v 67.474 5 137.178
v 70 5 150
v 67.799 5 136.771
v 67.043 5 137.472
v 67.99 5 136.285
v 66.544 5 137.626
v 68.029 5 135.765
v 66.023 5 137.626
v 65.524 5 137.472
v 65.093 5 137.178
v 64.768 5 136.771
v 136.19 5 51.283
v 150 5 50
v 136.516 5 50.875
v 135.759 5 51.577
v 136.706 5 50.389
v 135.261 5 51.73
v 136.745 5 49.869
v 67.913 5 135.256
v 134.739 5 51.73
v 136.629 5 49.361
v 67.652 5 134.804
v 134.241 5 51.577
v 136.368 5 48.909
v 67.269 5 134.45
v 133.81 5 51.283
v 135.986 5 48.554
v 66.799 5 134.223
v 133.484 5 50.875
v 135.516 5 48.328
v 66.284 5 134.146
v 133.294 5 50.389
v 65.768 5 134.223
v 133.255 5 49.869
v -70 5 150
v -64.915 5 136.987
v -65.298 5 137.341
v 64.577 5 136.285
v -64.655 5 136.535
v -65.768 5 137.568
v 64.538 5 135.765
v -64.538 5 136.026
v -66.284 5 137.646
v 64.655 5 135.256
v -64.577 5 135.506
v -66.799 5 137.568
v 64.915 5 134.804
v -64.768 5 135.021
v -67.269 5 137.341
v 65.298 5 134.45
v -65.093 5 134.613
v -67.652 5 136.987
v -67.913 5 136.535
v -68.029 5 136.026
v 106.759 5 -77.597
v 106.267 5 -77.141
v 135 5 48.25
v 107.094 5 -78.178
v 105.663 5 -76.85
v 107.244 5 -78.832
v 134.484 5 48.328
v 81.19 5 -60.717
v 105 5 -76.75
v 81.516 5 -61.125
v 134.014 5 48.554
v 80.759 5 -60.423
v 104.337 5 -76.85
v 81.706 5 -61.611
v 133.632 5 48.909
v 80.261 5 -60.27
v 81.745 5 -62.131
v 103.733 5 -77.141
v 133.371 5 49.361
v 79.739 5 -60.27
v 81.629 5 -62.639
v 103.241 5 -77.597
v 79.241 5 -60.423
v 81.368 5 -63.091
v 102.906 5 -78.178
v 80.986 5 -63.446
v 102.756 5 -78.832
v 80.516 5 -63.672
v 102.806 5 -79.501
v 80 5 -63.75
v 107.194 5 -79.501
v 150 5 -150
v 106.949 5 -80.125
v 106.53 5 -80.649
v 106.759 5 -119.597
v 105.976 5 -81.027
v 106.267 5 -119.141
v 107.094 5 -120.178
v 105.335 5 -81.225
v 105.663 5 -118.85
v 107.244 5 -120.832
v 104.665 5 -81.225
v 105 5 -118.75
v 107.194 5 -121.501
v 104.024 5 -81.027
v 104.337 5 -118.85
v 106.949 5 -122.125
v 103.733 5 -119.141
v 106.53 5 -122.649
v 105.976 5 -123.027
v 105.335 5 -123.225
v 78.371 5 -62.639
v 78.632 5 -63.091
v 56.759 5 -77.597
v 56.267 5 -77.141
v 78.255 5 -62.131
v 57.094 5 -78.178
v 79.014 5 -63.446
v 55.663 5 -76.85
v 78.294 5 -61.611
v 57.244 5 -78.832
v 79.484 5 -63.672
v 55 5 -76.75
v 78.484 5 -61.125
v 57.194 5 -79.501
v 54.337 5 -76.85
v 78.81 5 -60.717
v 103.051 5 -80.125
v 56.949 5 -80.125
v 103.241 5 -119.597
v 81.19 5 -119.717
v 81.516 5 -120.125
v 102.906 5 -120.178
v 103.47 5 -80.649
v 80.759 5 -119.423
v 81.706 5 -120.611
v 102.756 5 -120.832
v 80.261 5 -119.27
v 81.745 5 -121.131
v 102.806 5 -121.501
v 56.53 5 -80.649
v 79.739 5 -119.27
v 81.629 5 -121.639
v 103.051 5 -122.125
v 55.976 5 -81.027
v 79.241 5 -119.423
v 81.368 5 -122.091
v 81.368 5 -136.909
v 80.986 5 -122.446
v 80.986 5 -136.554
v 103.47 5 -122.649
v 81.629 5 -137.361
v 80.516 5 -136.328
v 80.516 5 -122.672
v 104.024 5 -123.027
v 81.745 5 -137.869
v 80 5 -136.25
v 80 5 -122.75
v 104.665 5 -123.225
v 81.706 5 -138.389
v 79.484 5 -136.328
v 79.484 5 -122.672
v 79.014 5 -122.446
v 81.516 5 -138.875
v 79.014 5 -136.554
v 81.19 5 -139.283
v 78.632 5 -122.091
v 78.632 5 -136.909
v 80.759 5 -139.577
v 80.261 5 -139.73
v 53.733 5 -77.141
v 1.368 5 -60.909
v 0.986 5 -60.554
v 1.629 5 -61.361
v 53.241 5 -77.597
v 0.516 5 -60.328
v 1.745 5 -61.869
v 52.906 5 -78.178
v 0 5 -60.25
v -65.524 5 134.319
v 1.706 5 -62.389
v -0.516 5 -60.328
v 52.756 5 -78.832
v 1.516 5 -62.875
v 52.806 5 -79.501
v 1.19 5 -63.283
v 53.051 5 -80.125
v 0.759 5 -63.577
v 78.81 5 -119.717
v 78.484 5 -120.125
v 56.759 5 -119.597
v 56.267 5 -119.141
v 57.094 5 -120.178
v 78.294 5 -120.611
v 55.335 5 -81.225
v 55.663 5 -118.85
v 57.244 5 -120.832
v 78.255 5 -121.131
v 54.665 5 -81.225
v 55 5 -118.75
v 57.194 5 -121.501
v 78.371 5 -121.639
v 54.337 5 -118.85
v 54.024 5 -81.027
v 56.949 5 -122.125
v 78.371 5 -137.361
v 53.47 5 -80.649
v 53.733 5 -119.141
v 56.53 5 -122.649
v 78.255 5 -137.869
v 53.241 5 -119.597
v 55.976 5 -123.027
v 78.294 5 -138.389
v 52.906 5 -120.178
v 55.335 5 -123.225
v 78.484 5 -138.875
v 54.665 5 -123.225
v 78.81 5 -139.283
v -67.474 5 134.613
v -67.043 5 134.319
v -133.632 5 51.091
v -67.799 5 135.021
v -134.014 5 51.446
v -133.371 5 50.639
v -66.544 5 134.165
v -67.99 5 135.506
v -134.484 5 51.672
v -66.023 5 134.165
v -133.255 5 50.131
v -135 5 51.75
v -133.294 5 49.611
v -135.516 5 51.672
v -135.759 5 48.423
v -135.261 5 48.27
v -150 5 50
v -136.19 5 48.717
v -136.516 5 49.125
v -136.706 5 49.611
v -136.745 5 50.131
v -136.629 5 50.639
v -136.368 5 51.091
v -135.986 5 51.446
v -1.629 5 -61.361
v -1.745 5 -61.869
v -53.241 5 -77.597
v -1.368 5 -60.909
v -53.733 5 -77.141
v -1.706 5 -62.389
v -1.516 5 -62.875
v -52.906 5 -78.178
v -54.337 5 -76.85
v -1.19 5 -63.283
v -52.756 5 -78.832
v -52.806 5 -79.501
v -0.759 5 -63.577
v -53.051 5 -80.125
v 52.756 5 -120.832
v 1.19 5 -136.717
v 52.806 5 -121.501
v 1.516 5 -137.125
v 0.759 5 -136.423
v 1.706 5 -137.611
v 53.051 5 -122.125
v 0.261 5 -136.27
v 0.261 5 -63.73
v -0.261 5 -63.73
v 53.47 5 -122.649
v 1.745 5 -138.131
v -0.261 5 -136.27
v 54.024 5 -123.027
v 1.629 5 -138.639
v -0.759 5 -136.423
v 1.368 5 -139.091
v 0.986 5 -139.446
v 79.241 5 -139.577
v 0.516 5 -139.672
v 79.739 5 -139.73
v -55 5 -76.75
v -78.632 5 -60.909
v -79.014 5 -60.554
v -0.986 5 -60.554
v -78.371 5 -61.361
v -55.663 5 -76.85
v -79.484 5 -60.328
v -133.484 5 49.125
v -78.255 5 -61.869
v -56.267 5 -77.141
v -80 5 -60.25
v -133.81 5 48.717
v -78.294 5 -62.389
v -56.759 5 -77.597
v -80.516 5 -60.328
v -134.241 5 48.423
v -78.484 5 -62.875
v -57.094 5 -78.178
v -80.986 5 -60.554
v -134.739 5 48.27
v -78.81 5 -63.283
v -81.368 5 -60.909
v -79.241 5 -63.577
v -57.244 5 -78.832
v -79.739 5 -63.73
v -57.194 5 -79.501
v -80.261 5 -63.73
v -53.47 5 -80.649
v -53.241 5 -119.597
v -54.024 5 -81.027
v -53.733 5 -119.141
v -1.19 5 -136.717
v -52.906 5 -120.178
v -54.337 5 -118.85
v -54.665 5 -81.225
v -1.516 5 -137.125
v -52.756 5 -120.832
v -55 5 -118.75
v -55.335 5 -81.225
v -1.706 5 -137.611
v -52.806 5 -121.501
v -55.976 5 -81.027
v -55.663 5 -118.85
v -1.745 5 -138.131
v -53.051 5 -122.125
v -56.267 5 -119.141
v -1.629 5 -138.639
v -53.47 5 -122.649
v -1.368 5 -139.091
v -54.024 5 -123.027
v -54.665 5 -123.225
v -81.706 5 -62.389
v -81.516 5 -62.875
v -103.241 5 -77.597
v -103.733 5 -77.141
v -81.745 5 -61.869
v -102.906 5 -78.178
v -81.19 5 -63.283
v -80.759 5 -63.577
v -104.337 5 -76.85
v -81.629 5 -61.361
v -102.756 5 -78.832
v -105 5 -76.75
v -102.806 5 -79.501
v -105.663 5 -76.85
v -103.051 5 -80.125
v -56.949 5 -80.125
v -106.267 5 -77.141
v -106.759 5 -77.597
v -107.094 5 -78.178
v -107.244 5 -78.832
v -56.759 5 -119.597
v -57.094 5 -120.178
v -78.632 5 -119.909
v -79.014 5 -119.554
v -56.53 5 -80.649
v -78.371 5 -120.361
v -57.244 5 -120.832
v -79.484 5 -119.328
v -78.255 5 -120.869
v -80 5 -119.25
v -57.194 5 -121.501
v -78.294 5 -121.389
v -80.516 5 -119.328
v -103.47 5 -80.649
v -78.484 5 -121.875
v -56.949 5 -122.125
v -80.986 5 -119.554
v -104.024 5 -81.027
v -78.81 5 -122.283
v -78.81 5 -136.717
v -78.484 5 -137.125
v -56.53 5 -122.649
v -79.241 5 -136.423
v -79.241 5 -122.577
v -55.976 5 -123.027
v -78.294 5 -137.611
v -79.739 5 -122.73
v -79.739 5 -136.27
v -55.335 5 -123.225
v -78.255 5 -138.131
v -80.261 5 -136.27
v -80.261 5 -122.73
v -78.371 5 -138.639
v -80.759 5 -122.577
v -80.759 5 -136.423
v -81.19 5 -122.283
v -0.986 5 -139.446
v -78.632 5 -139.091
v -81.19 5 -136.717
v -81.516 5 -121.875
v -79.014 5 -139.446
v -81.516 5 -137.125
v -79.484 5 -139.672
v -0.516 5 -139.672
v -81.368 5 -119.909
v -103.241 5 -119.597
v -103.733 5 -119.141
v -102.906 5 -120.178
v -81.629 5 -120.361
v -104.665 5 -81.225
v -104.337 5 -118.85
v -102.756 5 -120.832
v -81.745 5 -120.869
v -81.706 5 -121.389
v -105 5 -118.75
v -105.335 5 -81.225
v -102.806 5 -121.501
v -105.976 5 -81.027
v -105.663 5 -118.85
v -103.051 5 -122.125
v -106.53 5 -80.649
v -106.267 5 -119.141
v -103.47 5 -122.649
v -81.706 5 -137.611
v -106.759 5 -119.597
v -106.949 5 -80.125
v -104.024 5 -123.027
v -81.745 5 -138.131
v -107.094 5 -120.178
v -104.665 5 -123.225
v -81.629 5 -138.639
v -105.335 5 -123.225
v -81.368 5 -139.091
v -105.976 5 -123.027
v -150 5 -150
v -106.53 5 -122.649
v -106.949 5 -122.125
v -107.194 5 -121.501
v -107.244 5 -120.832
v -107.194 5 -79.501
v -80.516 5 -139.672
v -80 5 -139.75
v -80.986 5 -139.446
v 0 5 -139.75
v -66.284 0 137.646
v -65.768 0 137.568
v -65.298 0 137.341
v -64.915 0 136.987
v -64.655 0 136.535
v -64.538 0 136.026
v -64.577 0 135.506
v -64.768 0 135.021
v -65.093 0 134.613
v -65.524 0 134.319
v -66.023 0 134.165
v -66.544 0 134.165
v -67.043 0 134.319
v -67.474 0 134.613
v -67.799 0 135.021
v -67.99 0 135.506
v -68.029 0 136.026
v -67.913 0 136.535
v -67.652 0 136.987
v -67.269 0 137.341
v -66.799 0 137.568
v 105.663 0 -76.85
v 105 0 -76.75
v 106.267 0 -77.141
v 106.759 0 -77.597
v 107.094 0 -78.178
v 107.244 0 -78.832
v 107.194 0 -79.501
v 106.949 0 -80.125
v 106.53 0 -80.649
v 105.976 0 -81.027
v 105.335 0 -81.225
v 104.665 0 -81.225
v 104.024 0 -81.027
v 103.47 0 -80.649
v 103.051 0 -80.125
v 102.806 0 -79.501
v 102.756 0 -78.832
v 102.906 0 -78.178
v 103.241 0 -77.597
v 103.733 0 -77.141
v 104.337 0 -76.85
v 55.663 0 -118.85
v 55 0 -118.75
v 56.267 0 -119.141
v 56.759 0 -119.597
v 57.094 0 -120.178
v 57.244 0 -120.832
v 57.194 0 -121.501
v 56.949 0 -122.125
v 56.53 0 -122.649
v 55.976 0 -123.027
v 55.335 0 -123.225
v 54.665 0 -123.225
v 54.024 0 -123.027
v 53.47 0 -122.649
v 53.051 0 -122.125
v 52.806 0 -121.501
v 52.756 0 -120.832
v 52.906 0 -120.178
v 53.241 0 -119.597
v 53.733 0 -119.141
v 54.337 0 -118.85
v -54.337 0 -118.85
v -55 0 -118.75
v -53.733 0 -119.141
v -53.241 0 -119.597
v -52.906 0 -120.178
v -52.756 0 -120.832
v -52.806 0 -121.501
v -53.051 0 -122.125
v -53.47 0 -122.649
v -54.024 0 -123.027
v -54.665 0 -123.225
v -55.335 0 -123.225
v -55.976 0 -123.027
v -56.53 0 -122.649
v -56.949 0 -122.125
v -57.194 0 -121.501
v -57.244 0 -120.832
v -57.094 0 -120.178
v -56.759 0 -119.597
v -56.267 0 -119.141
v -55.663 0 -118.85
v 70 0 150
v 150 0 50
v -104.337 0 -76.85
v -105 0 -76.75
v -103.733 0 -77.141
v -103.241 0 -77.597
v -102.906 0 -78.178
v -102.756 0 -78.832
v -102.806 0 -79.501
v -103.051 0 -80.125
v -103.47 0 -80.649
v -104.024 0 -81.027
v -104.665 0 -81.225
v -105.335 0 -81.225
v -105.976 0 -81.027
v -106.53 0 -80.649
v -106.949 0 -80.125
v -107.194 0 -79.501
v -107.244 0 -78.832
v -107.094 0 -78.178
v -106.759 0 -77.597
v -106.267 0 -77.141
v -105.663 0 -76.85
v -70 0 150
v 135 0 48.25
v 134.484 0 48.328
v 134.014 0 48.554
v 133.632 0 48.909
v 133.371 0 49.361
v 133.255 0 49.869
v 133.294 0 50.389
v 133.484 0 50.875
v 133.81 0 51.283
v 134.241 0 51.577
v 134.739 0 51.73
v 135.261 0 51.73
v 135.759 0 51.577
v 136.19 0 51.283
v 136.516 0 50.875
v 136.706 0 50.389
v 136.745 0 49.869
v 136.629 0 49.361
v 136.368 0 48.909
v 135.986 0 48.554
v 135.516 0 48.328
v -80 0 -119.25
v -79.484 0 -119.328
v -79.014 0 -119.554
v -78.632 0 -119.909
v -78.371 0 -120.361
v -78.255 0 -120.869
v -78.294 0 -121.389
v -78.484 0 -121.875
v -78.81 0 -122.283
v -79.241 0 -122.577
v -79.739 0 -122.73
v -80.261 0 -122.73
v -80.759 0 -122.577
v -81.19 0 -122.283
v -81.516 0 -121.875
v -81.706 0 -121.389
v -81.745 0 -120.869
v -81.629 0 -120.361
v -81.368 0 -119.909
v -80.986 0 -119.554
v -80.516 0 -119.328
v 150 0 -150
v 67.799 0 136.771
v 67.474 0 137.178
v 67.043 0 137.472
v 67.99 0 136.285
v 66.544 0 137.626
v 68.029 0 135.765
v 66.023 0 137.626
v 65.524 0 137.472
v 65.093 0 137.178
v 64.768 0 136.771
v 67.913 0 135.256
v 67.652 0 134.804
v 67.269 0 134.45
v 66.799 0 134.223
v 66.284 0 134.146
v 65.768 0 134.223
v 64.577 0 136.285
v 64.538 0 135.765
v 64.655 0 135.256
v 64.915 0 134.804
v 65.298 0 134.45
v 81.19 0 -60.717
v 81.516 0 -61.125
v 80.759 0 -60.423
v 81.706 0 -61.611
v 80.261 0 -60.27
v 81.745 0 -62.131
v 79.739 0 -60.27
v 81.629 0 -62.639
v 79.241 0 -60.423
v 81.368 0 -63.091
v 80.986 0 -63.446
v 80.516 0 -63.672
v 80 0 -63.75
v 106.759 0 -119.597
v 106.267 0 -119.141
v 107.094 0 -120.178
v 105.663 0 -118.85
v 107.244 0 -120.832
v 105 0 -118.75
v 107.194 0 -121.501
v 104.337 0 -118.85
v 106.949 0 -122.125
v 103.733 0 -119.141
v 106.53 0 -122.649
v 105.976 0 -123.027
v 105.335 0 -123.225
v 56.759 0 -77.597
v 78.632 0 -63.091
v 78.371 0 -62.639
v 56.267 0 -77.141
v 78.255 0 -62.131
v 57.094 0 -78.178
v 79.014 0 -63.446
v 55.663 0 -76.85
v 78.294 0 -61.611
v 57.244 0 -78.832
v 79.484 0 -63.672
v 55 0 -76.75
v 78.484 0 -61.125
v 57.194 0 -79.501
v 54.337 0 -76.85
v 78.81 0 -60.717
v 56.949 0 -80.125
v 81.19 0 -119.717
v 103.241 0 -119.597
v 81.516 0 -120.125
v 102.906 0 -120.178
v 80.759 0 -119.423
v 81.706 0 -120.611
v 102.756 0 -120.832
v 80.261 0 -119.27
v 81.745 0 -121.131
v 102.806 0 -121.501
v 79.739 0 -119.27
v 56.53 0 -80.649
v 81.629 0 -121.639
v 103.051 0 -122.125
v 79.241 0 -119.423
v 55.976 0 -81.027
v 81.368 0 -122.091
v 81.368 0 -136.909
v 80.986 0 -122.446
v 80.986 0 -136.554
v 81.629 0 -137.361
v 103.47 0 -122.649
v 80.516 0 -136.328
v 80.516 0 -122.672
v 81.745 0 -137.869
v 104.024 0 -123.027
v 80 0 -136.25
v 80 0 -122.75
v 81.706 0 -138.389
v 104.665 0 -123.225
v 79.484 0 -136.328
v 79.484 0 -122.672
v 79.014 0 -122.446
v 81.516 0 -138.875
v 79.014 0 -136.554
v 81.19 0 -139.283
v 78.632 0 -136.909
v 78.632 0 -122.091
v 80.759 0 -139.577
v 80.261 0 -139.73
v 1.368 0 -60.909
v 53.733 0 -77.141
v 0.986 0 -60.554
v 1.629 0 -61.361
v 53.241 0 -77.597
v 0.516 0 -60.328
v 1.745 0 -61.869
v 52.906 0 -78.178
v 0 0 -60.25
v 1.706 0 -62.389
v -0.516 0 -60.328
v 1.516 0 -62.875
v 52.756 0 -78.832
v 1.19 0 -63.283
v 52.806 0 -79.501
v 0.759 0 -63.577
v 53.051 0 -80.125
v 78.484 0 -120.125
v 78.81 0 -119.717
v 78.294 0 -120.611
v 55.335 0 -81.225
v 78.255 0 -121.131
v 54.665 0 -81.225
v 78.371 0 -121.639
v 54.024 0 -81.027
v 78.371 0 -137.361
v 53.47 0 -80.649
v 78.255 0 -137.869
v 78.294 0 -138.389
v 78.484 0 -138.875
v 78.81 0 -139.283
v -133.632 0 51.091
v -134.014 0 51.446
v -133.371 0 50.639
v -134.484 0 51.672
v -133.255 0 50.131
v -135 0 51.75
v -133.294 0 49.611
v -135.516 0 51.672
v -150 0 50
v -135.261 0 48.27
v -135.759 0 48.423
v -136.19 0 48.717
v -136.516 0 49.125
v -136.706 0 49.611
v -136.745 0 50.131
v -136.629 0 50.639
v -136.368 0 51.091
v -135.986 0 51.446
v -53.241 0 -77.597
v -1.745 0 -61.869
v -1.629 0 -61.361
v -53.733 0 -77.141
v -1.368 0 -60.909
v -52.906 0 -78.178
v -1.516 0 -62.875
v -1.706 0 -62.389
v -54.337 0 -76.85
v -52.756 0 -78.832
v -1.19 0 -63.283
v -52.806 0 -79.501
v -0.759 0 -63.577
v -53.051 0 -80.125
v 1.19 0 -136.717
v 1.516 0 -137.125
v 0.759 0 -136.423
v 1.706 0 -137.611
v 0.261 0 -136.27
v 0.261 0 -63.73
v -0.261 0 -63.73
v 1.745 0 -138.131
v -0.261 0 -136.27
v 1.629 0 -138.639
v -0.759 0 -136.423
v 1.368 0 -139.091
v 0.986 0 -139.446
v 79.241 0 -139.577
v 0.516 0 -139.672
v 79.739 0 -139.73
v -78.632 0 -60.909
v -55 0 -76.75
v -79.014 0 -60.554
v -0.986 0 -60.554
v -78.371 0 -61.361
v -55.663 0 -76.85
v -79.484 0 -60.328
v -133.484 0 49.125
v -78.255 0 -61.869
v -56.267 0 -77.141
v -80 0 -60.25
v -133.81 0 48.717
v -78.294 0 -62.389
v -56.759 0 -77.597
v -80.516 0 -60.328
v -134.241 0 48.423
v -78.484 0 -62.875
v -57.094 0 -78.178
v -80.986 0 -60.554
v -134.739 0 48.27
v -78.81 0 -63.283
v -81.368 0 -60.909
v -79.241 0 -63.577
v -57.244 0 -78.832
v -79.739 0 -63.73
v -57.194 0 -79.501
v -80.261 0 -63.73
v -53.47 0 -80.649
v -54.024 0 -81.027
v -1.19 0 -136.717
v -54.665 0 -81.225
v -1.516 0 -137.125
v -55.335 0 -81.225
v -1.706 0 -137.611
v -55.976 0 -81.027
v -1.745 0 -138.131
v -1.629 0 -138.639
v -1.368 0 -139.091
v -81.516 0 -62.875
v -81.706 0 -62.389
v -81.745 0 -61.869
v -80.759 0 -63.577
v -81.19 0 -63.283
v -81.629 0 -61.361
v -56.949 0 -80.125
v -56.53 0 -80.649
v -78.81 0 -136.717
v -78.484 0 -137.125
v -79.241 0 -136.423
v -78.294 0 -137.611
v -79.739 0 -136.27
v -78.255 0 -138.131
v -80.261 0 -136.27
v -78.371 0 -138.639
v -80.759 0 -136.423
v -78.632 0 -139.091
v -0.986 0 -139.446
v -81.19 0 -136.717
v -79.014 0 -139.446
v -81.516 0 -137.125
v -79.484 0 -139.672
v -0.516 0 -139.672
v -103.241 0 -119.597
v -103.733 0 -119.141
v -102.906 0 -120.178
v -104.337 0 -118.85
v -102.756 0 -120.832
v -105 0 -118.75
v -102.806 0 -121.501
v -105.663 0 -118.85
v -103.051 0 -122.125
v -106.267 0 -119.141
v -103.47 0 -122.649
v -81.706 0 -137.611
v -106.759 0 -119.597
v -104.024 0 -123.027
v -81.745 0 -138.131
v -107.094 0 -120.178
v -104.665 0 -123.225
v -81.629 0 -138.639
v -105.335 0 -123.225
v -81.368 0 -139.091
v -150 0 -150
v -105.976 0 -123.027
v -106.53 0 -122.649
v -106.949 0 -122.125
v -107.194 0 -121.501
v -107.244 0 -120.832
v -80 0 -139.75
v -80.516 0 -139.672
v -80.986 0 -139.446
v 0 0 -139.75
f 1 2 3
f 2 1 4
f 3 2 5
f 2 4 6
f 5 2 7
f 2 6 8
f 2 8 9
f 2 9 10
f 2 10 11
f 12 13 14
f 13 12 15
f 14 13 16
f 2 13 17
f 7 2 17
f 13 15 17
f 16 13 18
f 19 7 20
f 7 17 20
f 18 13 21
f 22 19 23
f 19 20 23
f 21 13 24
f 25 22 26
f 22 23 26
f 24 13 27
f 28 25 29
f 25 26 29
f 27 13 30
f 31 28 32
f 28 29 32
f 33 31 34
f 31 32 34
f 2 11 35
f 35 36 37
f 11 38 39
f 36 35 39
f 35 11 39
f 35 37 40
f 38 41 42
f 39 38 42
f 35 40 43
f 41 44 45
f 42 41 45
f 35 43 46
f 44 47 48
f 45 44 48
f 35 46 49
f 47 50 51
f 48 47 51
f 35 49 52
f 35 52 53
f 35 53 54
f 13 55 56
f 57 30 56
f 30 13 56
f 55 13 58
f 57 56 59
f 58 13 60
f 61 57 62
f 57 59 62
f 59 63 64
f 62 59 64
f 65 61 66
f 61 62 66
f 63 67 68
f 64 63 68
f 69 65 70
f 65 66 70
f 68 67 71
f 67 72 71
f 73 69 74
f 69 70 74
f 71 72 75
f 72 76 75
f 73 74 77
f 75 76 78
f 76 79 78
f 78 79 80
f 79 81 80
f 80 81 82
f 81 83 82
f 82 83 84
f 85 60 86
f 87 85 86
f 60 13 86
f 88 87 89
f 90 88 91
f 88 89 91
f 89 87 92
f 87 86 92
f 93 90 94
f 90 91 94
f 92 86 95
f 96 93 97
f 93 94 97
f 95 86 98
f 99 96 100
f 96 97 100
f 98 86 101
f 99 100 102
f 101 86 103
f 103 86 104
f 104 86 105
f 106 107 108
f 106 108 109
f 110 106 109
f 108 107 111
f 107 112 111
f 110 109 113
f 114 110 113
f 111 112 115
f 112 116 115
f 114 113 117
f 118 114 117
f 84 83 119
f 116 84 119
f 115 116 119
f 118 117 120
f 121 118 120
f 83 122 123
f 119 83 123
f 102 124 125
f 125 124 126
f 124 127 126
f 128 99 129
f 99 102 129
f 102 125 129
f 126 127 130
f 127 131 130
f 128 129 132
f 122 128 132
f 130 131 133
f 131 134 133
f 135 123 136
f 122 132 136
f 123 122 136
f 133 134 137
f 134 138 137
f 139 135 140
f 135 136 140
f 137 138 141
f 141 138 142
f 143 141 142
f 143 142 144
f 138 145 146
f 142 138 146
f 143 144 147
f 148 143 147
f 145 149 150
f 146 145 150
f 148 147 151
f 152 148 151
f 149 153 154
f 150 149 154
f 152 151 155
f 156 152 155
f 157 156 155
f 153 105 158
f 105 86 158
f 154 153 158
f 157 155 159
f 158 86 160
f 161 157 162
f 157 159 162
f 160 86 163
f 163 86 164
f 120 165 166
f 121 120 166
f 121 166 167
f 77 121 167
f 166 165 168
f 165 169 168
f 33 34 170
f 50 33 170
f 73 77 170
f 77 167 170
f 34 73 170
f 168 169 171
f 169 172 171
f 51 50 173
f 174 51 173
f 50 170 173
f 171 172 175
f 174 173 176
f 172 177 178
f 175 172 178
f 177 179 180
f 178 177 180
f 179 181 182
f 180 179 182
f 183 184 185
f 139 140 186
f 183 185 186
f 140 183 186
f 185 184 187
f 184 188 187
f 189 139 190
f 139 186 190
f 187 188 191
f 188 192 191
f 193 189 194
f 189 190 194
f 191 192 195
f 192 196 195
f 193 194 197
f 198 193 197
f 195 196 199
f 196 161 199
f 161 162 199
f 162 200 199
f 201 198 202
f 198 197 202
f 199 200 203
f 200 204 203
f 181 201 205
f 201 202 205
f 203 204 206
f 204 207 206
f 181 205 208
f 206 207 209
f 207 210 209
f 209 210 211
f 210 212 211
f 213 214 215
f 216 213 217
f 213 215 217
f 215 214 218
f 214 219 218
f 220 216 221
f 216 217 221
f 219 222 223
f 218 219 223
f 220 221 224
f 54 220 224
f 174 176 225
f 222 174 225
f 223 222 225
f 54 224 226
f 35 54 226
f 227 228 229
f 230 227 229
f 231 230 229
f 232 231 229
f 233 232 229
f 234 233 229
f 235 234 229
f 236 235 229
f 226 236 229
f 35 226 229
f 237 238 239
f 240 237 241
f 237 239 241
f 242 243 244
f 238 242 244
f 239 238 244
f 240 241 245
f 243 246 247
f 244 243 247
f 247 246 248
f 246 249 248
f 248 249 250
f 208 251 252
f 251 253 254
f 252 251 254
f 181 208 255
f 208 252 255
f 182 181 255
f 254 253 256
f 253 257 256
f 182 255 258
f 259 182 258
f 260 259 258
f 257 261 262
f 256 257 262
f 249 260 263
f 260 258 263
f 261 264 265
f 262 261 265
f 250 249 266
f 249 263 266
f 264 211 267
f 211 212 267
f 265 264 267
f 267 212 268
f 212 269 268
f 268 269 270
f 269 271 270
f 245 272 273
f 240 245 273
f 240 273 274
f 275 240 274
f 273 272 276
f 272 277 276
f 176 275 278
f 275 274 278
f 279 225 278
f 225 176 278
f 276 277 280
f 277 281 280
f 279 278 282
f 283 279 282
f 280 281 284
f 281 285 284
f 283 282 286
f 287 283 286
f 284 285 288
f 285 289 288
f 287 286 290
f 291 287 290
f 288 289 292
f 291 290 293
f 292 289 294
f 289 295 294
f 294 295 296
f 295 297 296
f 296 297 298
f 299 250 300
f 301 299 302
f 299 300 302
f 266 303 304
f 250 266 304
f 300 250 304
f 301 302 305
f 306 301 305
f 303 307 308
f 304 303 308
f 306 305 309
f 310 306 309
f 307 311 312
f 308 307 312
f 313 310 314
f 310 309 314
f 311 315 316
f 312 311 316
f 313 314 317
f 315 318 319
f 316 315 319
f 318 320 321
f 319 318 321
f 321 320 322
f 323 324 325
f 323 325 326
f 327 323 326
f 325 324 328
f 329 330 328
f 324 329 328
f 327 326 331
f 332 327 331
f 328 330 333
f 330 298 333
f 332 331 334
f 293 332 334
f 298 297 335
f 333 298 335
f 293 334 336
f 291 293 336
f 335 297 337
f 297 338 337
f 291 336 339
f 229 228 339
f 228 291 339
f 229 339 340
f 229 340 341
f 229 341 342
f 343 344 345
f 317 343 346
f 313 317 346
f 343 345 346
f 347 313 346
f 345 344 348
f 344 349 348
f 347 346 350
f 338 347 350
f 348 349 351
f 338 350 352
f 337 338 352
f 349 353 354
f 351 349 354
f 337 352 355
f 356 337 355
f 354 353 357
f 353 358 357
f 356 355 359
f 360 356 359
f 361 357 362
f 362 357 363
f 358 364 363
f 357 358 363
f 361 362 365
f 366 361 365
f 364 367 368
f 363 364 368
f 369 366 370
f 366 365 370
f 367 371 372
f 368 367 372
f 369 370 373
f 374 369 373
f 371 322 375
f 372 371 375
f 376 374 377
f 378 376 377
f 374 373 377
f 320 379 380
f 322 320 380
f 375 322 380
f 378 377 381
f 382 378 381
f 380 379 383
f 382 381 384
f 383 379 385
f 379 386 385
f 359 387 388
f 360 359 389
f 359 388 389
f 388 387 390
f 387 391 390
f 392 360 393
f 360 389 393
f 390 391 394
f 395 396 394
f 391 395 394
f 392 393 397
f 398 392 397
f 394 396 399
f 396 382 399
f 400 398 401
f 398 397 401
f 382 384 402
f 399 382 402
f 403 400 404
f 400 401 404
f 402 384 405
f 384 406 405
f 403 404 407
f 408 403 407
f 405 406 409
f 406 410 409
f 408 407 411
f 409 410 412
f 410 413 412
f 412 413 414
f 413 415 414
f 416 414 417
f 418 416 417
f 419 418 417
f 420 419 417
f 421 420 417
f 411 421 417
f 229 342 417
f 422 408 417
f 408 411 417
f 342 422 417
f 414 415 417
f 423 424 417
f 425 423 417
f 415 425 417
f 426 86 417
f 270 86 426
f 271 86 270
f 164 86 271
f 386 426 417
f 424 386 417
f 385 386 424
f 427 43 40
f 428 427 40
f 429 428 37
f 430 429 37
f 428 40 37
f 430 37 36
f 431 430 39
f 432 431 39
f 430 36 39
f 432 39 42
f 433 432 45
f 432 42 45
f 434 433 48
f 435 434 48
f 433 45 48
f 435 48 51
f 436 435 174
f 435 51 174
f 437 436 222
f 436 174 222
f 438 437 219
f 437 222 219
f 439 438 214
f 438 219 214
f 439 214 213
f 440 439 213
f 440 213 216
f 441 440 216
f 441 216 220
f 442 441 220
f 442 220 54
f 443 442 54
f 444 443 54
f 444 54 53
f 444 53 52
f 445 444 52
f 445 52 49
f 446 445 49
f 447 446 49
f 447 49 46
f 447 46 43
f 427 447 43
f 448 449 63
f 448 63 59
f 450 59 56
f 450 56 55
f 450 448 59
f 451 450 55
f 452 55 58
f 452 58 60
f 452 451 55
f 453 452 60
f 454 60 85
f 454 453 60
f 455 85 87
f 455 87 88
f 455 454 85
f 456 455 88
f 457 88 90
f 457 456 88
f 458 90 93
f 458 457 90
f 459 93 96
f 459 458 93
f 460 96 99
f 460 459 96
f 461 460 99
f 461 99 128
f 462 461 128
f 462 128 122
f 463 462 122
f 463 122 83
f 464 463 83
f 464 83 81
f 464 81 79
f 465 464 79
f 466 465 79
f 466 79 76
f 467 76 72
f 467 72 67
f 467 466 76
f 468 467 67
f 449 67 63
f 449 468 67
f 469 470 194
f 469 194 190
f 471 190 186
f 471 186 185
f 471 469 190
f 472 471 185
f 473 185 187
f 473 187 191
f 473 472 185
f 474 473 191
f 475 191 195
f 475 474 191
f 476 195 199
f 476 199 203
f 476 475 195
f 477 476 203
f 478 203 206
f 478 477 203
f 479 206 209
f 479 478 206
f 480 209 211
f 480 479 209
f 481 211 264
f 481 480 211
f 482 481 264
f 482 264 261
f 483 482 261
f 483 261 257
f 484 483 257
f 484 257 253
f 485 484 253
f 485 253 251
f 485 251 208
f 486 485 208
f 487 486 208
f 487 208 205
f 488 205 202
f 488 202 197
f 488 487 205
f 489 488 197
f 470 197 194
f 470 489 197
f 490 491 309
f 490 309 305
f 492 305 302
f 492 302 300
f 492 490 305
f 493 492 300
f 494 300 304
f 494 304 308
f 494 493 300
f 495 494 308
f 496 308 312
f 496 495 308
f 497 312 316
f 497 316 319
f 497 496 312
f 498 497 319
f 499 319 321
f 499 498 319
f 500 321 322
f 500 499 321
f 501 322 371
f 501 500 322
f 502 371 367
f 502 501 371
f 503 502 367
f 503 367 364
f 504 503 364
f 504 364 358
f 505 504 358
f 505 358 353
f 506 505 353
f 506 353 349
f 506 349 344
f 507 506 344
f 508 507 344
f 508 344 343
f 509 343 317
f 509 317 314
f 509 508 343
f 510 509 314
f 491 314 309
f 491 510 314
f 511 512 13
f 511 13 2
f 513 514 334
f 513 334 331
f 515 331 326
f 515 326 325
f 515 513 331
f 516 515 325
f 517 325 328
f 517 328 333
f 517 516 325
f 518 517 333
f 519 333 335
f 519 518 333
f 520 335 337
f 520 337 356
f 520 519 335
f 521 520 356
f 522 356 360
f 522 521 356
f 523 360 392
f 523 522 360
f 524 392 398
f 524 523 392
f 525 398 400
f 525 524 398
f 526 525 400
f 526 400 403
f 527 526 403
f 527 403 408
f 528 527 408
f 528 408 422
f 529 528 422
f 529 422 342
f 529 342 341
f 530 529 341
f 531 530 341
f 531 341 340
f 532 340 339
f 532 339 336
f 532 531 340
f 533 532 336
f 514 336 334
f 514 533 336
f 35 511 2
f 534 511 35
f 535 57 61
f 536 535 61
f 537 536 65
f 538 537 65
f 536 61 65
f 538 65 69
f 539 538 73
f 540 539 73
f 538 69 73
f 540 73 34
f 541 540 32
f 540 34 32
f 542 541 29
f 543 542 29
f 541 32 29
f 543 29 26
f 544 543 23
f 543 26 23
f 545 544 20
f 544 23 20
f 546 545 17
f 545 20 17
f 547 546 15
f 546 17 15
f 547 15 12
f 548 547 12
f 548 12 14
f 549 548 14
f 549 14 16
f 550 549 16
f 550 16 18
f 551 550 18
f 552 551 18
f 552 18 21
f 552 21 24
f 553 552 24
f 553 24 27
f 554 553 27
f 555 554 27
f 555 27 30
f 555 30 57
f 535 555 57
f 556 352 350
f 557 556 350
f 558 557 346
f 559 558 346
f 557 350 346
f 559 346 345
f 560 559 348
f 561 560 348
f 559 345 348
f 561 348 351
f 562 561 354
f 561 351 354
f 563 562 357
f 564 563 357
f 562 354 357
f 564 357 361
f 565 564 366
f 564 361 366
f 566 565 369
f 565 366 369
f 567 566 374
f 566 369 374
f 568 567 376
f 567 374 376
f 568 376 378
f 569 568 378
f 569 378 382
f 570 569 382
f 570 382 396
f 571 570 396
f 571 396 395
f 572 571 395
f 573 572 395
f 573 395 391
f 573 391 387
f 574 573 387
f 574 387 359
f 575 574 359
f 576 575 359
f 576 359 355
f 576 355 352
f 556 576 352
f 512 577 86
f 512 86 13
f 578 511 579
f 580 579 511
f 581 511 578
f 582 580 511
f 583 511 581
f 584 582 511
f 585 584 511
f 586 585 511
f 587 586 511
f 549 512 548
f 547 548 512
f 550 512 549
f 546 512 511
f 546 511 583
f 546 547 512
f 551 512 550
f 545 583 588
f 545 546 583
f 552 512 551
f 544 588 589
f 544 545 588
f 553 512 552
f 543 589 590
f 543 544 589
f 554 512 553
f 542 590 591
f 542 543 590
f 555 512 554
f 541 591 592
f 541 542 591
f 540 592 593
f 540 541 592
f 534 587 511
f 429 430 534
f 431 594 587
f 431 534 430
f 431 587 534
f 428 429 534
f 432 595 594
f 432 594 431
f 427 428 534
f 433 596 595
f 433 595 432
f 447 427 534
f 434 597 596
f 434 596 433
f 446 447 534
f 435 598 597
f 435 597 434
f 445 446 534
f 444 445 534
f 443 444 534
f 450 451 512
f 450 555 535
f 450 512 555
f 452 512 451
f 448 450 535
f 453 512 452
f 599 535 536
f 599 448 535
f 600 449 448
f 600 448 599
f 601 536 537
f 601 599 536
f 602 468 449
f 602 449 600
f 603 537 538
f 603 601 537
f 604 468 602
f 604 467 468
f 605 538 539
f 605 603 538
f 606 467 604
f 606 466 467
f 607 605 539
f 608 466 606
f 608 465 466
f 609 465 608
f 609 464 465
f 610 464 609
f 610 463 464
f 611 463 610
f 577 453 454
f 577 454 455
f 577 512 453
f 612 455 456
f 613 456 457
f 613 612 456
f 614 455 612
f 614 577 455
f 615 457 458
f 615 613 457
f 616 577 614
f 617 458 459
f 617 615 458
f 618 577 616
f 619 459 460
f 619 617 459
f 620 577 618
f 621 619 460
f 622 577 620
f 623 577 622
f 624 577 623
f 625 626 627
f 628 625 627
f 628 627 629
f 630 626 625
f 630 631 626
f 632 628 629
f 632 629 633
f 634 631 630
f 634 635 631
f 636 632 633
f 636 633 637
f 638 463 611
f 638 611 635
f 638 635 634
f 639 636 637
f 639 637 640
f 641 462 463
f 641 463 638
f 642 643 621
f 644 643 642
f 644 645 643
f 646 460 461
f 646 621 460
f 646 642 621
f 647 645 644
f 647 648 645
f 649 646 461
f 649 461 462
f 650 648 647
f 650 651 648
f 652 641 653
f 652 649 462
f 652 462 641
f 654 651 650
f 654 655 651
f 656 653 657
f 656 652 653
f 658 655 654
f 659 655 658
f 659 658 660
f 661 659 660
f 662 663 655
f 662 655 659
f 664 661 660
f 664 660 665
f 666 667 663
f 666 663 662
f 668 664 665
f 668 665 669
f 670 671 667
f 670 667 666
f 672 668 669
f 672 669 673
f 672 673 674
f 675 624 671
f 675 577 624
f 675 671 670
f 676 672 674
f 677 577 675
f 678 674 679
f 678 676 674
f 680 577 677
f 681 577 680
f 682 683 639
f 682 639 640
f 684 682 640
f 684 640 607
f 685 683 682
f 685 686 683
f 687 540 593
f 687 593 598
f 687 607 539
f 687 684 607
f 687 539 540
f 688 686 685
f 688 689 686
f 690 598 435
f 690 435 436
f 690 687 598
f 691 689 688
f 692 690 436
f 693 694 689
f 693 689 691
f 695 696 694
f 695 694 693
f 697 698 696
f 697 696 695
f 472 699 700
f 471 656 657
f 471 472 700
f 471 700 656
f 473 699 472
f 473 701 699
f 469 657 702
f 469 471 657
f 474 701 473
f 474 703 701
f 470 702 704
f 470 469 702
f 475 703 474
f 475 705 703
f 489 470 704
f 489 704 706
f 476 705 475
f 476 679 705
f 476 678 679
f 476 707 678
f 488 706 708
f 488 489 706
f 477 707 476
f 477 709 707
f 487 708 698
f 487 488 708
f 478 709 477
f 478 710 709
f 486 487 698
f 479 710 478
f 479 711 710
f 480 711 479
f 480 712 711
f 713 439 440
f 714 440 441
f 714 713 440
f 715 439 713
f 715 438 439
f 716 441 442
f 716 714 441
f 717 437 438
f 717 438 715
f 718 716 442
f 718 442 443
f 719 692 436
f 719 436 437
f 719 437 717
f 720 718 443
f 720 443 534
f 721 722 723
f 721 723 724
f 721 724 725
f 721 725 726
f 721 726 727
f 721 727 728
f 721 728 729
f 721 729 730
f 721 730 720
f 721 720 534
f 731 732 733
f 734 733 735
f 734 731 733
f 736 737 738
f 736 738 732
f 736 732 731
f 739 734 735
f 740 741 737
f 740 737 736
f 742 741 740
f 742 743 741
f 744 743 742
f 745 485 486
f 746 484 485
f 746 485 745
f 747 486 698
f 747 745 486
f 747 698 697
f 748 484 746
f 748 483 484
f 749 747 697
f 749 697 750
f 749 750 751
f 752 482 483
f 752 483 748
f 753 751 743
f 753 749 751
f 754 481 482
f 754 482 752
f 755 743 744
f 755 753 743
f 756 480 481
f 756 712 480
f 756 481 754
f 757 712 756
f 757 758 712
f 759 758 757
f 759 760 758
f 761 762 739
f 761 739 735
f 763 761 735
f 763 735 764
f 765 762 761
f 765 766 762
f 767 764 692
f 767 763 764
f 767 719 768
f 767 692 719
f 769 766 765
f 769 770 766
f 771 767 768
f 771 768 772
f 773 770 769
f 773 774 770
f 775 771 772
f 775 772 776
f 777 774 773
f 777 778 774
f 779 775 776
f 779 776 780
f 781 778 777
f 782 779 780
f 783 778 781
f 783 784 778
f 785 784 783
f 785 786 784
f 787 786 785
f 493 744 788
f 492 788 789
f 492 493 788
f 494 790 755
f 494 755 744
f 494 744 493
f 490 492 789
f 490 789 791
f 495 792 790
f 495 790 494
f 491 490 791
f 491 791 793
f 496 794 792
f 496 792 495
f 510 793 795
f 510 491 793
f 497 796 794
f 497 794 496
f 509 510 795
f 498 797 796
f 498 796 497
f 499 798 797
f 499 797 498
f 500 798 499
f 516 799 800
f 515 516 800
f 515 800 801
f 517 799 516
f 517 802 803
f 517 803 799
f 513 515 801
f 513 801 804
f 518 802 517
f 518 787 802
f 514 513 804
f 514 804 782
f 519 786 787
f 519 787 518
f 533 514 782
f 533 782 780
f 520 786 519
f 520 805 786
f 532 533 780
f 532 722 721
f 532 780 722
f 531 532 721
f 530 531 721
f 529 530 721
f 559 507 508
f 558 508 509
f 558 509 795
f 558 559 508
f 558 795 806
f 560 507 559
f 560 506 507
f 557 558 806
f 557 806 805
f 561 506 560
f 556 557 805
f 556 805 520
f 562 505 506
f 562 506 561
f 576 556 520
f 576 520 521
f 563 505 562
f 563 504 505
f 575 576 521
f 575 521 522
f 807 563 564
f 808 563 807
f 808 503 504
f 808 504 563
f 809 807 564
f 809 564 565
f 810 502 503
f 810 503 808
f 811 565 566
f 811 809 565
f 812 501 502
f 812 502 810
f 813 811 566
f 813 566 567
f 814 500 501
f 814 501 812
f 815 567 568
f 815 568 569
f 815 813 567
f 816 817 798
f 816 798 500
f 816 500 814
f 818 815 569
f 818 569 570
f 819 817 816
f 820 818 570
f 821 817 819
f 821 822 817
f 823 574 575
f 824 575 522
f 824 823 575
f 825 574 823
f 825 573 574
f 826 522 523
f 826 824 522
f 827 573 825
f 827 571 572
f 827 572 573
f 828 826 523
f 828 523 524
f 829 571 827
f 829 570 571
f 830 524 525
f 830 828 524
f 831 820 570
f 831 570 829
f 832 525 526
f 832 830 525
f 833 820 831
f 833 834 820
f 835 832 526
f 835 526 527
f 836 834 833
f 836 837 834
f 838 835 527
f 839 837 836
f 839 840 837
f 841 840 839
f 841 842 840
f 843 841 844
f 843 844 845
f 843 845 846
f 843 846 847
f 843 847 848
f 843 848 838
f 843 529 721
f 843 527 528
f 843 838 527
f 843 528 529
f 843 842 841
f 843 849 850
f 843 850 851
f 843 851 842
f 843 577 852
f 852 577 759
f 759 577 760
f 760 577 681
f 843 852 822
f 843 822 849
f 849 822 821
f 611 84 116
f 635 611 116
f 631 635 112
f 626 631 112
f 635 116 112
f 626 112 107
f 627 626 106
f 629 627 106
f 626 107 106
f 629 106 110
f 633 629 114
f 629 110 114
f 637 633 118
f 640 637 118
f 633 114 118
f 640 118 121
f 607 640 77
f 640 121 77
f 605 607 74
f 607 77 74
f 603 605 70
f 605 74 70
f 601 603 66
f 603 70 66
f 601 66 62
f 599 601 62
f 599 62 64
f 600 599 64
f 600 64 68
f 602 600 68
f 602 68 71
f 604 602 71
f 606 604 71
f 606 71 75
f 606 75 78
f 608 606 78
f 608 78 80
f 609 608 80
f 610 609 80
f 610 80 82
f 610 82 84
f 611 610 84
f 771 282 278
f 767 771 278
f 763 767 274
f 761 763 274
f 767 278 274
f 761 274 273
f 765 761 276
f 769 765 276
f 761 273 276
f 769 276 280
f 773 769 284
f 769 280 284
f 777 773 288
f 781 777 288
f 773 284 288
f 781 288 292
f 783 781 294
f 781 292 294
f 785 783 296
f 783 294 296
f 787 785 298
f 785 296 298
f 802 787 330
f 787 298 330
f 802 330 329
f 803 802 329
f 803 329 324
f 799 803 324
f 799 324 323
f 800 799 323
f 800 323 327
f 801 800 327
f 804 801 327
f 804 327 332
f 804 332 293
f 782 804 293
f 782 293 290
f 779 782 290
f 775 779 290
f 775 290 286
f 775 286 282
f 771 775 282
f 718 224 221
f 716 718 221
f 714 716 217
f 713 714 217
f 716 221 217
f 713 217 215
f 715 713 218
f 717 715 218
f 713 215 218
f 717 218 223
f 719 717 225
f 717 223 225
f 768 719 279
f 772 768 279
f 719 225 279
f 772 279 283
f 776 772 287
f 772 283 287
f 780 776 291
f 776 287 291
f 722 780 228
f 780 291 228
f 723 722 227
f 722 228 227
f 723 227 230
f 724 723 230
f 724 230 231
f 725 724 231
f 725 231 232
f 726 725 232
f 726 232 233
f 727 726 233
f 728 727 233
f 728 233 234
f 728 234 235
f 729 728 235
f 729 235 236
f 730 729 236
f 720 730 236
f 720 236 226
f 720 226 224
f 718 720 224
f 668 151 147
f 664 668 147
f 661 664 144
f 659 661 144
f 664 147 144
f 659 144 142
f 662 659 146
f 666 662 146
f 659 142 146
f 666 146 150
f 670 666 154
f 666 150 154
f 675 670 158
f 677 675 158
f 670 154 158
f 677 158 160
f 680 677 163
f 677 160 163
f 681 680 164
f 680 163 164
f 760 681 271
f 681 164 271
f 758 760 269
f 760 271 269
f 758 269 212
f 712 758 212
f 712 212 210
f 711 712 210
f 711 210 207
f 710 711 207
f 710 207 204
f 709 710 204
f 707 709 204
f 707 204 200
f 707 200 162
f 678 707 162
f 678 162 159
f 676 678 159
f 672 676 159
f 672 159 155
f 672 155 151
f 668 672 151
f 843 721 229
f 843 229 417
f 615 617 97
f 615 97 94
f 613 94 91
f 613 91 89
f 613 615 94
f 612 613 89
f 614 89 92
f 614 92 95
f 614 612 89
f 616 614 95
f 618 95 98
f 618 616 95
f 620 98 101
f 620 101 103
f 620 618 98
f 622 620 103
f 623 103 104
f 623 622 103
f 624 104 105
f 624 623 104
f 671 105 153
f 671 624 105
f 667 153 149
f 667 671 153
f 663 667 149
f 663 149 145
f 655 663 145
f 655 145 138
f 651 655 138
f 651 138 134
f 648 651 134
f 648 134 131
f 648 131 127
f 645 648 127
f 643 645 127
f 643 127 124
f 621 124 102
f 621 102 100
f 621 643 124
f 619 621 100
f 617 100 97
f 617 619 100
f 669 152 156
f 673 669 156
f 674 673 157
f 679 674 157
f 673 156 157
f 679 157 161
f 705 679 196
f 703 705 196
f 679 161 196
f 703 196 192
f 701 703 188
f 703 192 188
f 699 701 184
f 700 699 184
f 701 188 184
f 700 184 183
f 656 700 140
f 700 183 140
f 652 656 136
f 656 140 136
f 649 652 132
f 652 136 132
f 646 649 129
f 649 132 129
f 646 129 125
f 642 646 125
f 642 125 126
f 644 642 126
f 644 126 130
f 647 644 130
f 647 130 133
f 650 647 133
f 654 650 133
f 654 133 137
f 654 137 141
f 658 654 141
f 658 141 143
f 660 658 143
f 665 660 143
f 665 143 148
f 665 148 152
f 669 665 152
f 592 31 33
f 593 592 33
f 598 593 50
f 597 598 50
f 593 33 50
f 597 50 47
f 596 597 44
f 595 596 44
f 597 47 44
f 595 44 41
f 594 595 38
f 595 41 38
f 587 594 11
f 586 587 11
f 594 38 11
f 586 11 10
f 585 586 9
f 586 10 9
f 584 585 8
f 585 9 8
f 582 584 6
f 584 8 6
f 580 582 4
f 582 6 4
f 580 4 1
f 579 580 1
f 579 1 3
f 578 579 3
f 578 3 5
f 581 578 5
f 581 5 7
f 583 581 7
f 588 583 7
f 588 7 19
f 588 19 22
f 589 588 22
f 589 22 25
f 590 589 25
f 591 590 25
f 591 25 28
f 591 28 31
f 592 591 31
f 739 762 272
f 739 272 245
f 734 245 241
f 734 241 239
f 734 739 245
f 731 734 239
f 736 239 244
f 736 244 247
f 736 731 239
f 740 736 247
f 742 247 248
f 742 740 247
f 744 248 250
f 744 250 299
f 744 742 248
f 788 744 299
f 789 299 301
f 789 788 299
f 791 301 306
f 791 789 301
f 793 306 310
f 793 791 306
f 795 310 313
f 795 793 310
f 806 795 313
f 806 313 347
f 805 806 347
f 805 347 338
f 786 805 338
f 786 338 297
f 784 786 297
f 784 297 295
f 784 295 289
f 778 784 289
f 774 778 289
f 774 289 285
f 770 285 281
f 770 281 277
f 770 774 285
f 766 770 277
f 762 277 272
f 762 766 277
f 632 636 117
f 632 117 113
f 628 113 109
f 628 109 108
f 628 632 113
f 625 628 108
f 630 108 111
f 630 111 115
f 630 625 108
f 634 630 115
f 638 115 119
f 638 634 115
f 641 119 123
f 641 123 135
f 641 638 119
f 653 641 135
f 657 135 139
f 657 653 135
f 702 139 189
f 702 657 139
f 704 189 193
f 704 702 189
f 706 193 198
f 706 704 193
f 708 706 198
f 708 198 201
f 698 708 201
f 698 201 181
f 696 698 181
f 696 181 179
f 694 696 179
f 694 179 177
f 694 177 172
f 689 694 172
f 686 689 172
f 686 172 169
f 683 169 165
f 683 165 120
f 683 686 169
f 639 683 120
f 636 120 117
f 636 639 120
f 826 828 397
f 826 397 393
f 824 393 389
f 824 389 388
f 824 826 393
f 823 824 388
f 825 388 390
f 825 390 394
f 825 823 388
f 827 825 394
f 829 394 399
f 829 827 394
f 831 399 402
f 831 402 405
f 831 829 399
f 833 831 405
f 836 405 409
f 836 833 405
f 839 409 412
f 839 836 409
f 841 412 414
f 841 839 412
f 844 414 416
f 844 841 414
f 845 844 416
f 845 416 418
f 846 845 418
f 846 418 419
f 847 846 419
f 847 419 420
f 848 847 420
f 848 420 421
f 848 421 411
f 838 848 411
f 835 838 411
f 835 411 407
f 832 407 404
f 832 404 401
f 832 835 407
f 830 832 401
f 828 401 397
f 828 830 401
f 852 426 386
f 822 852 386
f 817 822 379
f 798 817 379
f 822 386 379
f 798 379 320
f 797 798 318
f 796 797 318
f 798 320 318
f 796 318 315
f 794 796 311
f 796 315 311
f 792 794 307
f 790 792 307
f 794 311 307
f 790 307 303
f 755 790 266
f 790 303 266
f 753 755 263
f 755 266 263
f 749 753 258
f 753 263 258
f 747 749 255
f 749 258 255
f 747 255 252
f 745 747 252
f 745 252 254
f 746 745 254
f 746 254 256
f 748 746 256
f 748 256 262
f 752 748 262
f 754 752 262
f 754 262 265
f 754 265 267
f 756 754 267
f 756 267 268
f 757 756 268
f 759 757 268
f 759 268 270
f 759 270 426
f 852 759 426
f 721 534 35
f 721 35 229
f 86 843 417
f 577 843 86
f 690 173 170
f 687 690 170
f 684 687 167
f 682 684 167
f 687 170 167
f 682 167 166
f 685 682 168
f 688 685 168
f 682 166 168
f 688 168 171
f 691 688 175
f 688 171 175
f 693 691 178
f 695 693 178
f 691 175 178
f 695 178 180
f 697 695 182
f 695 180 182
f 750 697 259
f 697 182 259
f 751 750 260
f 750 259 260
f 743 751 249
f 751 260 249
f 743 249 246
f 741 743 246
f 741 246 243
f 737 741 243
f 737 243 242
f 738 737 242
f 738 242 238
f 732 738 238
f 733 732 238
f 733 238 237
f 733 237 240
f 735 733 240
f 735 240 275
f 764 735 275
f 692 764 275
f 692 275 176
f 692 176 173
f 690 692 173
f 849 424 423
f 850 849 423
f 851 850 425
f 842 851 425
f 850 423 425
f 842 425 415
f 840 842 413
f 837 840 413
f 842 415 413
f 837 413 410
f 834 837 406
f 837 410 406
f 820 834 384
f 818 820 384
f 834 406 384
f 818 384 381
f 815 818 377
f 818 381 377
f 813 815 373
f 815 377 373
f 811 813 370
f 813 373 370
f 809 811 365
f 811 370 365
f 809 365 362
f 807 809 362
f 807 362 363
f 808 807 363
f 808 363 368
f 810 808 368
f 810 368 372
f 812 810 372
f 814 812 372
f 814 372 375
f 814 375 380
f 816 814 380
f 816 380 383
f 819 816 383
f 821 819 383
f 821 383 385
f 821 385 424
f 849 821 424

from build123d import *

# Parameters (mm, degrees)
SKETCH_2_R          = 2.25
EXTRUDE_2_DEPTH     = 5
SKETCH_5_R          = 1.75
CUT_EXTRUDE_3_DEPTH = 213.190951739
SKETCH_8_R          = 1.75
CUT_EXTRUDE_5_DEPTH = 213.190951739


with BuildPart() as part:
    # 草圖2 → 填料-伸長2 (new body)
    with BuildSketch(Plane(origin=(0, 0, 0), x_dir=(1, 0, 0), z_dir=(0, 1, 0))):
        Polygon((-150, 150), (150, 150), (150, -50), (70, -150), (-70, -150), (-150, -50), align=None)
        with Locations(Location((-105, 121, 0), (0, 0, 270))):
            Circle(SKETCH_2_R, mode=Mode.SUBTRACT)
        with Locations(Location((-105, 79, 0), (0, 0, 270))):
            Circle(SKETCH_2_R, mode=Mode.SUBTRACT)
        with Locations(Location((-55, 79, 0), (0, 0, 270))):
            Circle(SKETCH_2_R, mode=Mode.SUBTRACT)
        with Locations(Location((-55, 121, 0), (0, 0, 270))):
            Circle(SKETCH_2_R, mode=Mode.SUBTRACT)
        with Locations(Location((55, 121, 0), (0, 0, 270))):
            Circle(SKETCH_2_R, mode=Mode.SUBTRACT)
        with Locations(Location((55, 79, 0), (0, 0, 270))):
            Circle(SKETCH_2_R, mode=Mode.SUBTRACT)
        with Locations(Location((105, 121, 0), (0, 0, 270))):
            Circle(SKETCH_2_R, mode=Mode.SUBTRACT)
        with Locations(Location((105, 79, 0), (0, 0, 270))):
            Circle(SKETCH_2_R, mode=Mode.SUBTRACT)
    extrude(amount=EXTRUDE_2_DEPTH)

    # 草圖5 → 除料-伸長3 (cut, through all)
    with BuildSketch(Plane(origin=(0, 5, 0), x_dir=(1, 0, 0), z_dir=(0, 1, 0))):
        with Locations(Location((0, 62, 0), (0, 0, 270))):
            Circle(SKETCH_5_R)
        with Locations(Location((-80, 62, 0), (0, 0, 270))):
            Circle(SKETCH_5_R)
        with Locations(Location((80, 62, 0), (0, 0, 90))):
            Circle(SKETCH_5_R)
        with Locations(Location((80, 138, 0), (0, 0, 270))):
            Circle(SKETCH_5_R)
        with Locations(Location((-80, 138, 0), (0, 0, 90))):
            Circle(SKETCH_5_R)
        with Locations(Location((0, 138, 0), (0, 0, 90))):
            Circle(SKETCH_5_R)
    extrude(amount=-CUT_EXTRUDE_3_DEPTH, mode=Mode.SUBTRACT)

    # 草圖8 → 除料-伸長5 (cut, through all)
    with BuildSketch(Plane(origin=(0, 5, 0), x_dir=(1, 0, 0), z_dir=(0, 1, 0))):
        with Locations(Location((-80, 121, 0), (0, 0, 270))):
            Circle(SKETCH_8_R)
        with Locations(Location((80, 121, 0), (0, 0, 90))):
            Circle(SKETCH_8_R)
        with Locations(Location((-135, -50, 0), (0, 0, 270))):
            Circle(SKETCH_8_R)
        with Locations(Location((-66.283544769, -135.895569039, 0), (0, 0, 270))):
            Circle(SKETCH_8_R)
        with Locations(Location((135, -50, 0), (0, 0, 90))):
            Circle(SKETCH_8_R)
        with Locations(Location((66.283544769, -135.895569039, 0), (0, 0, 90))):
            Circle(SKETCH_8_R)
    extrude(amount=-CUT_EXTRUDE_5_DEPTH, mode=Mode.SUBTRACT)


solid = part.part
